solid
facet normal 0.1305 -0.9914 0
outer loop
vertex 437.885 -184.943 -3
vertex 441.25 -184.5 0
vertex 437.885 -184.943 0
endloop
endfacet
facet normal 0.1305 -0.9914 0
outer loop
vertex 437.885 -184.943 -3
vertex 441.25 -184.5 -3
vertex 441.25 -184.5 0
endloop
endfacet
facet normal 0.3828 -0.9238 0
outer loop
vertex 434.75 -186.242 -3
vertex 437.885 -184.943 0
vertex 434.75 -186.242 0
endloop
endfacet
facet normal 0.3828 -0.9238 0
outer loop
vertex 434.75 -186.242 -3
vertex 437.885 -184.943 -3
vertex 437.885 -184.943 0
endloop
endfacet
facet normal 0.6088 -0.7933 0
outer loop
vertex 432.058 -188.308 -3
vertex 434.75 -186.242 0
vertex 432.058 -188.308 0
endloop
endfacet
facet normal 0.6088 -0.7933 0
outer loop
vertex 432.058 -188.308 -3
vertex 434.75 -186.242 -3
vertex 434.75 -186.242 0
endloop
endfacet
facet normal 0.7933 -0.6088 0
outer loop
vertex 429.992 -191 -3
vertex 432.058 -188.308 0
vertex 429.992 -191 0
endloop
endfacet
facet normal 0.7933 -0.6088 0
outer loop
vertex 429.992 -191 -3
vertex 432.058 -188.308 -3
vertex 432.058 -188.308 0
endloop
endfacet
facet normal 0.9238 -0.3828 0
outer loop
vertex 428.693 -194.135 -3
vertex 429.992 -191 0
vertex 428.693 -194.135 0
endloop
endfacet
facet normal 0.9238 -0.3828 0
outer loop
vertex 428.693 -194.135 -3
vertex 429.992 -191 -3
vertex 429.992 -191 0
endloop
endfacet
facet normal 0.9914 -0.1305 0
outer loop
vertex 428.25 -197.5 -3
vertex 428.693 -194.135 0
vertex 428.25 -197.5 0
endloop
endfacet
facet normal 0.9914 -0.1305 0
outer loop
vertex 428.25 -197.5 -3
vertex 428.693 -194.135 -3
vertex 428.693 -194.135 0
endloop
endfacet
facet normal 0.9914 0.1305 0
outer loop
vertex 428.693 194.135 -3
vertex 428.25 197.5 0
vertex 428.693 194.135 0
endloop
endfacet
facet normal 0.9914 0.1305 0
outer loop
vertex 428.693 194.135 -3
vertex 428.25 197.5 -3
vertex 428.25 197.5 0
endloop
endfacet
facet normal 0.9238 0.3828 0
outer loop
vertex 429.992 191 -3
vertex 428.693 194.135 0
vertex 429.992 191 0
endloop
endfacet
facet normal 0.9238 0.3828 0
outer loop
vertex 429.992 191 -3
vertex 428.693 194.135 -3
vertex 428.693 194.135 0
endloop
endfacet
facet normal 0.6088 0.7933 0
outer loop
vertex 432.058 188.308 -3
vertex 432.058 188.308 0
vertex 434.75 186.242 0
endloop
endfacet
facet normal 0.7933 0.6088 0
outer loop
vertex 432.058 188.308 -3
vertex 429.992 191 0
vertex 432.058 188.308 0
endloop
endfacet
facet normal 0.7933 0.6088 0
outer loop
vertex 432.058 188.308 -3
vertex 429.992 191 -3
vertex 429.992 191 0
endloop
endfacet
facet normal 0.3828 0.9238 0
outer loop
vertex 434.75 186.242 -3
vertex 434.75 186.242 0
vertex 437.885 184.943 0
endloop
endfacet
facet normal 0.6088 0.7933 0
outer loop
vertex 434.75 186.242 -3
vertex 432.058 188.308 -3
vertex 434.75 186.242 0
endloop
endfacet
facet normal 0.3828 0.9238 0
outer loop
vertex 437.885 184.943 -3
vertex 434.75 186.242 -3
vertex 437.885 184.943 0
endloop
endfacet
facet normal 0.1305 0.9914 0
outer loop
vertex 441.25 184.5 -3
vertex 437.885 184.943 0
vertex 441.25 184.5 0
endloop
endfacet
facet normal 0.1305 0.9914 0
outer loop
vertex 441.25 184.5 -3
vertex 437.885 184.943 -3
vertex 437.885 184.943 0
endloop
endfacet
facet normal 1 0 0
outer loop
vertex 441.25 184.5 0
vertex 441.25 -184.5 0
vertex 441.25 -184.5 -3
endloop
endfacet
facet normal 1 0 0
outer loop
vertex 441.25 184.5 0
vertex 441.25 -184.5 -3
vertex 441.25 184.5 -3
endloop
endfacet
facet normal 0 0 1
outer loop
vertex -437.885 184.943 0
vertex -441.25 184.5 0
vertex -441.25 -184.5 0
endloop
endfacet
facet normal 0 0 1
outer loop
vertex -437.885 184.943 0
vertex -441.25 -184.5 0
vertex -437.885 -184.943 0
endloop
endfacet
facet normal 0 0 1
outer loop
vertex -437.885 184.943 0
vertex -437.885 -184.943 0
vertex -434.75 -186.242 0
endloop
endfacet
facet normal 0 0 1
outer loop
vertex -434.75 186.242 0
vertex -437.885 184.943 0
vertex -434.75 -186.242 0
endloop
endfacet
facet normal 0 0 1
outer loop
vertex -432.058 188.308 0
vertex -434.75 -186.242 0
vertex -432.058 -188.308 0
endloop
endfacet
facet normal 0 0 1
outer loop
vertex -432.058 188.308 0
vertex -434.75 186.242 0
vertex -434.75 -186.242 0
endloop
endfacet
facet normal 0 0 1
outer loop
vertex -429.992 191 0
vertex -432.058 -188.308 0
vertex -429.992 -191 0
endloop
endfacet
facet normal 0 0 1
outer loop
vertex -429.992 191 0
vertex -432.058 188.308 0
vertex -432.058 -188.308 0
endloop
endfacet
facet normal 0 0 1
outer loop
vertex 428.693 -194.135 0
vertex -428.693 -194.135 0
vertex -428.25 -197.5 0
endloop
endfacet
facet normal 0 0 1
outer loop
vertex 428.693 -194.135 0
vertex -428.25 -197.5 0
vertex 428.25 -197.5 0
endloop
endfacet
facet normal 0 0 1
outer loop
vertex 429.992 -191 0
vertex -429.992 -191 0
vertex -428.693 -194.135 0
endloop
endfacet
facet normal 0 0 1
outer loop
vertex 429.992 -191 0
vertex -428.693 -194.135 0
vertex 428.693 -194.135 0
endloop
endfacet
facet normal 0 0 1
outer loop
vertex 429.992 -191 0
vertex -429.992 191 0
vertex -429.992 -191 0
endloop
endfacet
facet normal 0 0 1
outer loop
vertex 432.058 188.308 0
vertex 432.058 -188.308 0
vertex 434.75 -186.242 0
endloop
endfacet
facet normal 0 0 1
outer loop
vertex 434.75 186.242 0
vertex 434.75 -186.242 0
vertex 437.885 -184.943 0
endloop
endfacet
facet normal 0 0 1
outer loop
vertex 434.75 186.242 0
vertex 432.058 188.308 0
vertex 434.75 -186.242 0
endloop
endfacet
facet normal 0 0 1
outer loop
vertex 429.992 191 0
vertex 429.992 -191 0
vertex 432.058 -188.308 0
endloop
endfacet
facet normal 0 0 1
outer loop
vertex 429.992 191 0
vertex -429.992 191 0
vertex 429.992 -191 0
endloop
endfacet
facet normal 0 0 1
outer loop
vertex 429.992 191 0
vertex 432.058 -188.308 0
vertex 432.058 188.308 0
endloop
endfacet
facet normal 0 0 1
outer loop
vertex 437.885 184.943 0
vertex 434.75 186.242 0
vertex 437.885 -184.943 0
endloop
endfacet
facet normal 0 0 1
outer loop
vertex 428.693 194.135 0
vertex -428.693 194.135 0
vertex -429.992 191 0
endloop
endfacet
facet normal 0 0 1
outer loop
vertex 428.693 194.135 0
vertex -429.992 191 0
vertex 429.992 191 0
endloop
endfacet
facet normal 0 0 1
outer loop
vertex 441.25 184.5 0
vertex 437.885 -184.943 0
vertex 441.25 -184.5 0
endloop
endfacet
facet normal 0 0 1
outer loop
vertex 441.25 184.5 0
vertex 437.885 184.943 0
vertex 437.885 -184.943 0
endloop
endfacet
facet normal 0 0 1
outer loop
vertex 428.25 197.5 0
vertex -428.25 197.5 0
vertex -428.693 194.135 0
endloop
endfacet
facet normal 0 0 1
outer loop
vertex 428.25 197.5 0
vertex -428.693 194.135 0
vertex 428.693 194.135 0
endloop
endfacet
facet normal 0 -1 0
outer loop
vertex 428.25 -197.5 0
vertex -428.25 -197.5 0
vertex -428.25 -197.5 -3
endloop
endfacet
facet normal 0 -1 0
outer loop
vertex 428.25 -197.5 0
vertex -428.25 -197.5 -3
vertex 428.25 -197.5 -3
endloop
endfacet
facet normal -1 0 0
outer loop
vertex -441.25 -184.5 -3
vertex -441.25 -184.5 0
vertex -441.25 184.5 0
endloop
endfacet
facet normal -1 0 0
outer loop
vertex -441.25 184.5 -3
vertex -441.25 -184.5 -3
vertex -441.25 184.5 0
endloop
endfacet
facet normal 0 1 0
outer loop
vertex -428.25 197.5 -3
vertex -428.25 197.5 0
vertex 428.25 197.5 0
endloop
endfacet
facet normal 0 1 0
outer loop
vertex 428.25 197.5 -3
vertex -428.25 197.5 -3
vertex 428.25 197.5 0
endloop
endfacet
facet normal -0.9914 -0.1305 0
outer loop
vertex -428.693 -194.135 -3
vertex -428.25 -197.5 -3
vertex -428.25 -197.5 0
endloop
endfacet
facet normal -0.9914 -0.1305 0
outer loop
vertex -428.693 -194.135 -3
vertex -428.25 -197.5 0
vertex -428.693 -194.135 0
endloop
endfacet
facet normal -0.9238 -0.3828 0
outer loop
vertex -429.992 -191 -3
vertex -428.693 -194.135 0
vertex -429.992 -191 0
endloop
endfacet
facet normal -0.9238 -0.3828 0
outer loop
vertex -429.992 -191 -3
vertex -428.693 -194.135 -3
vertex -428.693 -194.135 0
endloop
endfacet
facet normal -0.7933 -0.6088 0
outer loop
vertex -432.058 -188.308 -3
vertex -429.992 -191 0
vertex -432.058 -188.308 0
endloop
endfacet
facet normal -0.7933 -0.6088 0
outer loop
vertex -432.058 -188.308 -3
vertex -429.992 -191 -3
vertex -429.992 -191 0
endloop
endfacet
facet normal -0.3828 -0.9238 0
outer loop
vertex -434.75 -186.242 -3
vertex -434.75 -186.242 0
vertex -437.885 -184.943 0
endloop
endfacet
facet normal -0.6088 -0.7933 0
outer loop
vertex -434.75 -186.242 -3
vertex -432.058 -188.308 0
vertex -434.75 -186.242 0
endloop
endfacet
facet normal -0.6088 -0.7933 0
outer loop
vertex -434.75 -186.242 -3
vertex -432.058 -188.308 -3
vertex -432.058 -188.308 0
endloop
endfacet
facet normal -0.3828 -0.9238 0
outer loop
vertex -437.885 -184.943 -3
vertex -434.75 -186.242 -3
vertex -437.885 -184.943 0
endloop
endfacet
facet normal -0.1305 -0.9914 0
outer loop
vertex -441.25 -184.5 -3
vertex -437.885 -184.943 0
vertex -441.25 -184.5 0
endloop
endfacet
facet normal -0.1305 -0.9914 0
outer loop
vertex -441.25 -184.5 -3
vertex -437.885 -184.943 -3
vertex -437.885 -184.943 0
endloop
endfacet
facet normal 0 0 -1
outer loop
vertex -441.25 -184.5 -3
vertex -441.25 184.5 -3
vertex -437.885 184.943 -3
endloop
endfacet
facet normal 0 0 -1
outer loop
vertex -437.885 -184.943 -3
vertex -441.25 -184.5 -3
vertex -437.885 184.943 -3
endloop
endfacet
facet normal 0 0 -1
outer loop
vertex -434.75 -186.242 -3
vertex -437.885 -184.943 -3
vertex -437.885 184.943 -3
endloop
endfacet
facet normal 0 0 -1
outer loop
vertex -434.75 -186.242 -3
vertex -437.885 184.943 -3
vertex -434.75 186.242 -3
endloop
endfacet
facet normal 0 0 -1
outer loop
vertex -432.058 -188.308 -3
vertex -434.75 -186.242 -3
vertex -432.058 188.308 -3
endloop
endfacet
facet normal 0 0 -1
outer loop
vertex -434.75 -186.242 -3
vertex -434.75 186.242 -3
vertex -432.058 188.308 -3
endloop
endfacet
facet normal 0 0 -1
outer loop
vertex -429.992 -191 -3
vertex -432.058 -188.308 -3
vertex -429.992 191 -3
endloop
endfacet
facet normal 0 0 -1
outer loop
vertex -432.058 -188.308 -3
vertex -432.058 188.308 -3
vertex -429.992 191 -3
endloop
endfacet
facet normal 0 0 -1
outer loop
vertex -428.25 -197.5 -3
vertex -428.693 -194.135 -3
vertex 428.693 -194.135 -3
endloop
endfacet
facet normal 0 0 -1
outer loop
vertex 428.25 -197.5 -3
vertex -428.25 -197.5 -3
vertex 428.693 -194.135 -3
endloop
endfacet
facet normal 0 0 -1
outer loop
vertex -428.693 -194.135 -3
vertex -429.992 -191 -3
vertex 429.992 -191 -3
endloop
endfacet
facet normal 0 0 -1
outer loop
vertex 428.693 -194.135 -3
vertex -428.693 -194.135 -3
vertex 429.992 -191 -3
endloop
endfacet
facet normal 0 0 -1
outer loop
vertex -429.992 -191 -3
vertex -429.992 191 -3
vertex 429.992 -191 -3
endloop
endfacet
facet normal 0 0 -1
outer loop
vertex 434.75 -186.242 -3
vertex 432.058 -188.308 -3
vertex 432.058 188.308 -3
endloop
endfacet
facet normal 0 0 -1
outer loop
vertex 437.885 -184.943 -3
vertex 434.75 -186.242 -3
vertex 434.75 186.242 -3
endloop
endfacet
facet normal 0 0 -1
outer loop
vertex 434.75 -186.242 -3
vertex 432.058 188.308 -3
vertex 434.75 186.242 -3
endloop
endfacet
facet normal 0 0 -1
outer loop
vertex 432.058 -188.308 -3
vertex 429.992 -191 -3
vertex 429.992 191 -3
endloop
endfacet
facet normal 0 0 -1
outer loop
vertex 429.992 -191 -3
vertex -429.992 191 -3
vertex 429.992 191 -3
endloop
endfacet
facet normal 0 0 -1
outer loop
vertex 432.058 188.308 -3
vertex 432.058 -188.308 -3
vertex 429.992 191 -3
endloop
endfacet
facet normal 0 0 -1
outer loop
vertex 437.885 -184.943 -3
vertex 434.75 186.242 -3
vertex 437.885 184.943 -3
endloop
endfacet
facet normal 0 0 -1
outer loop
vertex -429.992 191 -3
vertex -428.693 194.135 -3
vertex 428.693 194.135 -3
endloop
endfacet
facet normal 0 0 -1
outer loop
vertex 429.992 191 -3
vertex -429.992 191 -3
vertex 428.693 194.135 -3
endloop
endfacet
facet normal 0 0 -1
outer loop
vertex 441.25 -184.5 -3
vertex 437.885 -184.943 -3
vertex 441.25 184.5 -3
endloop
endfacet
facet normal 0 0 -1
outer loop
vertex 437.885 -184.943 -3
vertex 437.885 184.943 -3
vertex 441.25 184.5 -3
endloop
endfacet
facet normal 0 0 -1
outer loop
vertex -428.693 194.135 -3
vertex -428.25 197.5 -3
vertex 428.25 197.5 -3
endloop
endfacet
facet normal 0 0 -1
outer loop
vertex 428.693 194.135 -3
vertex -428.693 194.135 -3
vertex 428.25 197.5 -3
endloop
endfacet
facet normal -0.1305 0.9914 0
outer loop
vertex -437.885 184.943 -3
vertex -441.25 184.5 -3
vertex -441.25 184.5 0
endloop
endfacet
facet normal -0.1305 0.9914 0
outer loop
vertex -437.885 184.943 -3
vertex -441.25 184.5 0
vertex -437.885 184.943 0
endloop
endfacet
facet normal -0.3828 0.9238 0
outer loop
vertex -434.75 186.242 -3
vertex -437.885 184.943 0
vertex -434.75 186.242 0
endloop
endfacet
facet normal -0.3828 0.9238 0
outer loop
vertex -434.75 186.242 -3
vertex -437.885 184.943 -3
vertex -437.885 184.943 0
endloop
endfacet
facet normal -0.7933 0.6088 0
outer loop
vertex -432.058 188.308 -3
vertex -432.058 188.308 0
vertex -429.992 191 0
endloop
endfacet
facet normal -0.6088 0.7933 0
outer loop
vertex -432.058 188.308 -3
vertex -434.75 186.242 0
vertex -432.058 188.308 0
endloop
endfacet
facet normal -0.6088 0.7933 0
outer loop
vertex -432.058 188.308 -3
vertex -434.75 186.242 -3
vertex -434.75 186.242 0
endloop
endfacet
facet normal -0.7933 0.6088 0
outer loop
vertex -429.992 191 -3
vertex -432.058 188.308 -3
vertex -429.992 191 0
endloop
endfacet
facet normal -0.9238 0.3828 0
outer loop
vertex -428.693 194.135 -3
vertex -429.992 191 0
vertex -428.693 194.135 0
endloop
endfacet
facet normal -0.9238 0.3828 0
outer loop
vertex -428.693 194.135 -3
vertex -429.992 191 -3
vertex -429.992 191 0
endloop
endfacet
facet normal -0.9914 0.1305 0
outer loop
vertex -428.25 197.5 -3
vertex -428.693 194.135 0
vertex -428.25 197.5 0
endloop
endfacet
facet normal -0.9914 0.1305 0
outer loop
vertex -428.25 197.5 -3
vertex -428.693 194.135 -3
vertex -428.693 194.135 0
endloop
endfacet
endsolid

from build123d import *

# Parameters (mm, degrees)
SKETCH1_W               = 882.5
SKETCH1_H               = 395
BOSS_EXTRUDE1_DEPTH     = 3
CUT_EXTRUDE1_DEPTH      = 484.442667232
CUT_EXTRUDE1_DEPTH_BACK = 484.442667232
SKETCH3_R               = 13


with BuildPart() as part:
    # Sketch1 → Boss-Extrude1 (new body)
    with BuildSketch(Plane.XY):
        Rectangle(SKETCH1_W, SKETCH1_H)
    extrude(amount=-BOSS_EXTRUDE1_DEPTH)

    # Sketch3 → Cut-Extrude1 (cut, two sides: drawn at the far end of the back side and taken through both)
    with BuildSketch(Plane.XY.offset(-CUT_EXTRUDE1_DEPTH_BACK)):
        with Locations((441.25, -197.5)):
            Circle(SKETCH3_R)
        with Locations((441.25, 197.5)):
            Circle(SKETCH3_R)
        with Locations((-441.25, 197.5)):
            Circle(SKETCH3_R)
        with Locations((-441.25, -197.5)):
            Circle(SKETCH3_R)
    extrude(amount=CUT_EXTRUDE1_DEPTH + CUT_EXTRUDE1_DEPTH_BACK, mode=Mode.SUBTRACT)


solid = part.part
